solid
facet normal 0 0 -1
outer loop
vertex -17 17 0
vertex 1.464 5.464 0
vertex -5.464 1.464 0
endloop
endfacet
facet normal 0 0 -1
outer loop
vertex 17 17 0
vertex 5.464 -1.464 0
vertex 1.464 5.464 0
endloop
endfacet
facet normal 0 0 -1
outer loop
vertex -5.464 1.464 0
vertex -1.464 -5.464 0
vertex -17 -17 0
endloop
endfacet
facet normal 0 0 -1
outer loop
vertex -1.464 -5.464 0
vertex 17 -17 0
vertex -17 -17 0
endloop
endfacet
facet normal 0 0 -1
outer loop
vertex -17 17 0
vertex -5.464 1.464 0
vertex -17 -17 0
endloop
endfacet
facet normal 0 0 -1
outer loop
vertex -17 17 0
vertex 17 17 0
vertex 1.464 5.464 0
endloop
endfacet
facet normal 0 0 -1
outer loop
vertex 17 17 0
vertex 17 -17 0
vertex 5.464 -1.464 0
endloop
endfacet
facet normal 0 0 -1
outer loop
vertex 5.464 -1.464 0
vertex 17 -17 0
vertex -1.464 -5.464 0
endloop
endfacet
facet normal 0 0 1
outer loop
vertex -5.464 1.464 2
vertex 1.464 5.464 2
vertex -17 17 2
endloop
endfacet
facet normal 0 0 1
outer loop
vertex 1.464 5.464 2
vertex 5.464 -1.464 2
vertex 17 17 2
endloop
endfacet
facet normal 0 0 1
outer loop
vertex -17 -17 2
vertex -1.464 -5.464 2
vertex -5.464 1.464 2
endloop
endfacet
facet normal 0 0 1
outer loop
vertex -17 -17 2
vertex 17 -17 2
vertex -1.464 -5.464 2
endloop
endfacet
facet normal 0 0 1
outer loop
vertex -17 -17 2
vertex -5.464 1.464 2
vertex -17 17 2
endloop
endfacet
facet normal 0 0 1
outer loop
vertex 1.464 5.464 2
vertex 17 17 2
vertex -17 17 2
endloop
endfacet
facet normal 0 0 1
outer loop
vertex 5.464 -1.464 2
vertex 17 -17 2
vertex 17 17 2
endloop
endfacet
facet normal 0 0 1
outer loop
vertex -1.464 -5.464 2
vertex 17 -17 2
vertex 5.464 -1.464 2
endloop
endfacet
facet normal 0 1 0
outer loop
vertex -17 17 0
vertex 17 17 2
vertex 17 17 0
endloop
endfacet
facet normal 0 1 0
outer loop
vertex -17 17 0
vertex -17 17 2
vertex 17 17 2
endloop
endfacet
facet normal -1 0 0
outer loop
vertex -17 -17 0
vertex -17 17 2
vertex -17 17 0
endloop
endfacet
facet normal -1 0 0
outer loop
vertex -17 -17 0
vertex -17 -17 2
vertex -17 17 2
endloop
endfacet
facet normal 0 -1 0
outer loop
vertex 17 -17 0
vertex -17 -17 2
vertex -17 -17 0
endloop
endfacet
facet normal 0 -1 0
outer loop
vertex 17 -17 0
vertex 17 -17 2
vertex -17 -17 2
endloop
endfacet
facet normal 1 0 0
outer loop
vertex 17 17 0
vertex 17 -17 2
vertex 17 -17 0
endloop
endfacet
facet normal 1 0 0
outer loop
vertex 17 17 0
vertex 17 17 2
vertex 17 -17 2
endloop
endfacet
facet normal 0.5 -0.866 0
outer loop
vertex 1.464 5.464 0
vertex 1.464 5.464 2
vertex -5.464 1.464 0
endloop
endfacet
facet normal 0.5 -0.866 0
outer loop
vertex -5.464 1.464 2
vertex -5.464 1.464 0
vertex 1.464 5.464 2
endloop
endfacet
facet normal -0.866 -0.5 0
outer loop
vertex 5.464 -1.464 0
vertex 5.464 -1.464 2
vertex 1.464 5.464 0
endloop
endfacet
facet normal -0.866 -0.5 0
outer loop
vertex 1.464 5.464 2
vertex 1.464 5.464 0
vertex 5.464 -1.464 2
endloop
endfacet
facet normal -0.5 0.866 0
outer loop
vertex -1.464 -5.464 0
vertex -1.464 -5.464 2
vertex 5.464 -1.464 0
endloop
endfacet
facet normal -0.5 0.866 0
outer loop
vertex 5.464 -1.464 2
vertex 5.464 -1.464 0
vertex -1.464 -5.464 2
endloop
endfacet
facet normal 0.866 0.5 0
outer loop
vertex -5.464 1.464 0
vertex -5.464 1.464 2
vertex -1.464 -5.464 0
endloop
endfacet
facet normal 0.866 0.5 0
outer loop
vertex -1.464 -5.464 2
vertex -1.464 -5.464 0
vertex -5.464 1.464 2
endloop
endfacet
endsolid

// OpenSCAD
linear_extrude(2) offset(delta=2) difference(){ square(30,center=true); projection(cut=true) rotate([0,0,30]) cube([12,12,20],center=true); }
